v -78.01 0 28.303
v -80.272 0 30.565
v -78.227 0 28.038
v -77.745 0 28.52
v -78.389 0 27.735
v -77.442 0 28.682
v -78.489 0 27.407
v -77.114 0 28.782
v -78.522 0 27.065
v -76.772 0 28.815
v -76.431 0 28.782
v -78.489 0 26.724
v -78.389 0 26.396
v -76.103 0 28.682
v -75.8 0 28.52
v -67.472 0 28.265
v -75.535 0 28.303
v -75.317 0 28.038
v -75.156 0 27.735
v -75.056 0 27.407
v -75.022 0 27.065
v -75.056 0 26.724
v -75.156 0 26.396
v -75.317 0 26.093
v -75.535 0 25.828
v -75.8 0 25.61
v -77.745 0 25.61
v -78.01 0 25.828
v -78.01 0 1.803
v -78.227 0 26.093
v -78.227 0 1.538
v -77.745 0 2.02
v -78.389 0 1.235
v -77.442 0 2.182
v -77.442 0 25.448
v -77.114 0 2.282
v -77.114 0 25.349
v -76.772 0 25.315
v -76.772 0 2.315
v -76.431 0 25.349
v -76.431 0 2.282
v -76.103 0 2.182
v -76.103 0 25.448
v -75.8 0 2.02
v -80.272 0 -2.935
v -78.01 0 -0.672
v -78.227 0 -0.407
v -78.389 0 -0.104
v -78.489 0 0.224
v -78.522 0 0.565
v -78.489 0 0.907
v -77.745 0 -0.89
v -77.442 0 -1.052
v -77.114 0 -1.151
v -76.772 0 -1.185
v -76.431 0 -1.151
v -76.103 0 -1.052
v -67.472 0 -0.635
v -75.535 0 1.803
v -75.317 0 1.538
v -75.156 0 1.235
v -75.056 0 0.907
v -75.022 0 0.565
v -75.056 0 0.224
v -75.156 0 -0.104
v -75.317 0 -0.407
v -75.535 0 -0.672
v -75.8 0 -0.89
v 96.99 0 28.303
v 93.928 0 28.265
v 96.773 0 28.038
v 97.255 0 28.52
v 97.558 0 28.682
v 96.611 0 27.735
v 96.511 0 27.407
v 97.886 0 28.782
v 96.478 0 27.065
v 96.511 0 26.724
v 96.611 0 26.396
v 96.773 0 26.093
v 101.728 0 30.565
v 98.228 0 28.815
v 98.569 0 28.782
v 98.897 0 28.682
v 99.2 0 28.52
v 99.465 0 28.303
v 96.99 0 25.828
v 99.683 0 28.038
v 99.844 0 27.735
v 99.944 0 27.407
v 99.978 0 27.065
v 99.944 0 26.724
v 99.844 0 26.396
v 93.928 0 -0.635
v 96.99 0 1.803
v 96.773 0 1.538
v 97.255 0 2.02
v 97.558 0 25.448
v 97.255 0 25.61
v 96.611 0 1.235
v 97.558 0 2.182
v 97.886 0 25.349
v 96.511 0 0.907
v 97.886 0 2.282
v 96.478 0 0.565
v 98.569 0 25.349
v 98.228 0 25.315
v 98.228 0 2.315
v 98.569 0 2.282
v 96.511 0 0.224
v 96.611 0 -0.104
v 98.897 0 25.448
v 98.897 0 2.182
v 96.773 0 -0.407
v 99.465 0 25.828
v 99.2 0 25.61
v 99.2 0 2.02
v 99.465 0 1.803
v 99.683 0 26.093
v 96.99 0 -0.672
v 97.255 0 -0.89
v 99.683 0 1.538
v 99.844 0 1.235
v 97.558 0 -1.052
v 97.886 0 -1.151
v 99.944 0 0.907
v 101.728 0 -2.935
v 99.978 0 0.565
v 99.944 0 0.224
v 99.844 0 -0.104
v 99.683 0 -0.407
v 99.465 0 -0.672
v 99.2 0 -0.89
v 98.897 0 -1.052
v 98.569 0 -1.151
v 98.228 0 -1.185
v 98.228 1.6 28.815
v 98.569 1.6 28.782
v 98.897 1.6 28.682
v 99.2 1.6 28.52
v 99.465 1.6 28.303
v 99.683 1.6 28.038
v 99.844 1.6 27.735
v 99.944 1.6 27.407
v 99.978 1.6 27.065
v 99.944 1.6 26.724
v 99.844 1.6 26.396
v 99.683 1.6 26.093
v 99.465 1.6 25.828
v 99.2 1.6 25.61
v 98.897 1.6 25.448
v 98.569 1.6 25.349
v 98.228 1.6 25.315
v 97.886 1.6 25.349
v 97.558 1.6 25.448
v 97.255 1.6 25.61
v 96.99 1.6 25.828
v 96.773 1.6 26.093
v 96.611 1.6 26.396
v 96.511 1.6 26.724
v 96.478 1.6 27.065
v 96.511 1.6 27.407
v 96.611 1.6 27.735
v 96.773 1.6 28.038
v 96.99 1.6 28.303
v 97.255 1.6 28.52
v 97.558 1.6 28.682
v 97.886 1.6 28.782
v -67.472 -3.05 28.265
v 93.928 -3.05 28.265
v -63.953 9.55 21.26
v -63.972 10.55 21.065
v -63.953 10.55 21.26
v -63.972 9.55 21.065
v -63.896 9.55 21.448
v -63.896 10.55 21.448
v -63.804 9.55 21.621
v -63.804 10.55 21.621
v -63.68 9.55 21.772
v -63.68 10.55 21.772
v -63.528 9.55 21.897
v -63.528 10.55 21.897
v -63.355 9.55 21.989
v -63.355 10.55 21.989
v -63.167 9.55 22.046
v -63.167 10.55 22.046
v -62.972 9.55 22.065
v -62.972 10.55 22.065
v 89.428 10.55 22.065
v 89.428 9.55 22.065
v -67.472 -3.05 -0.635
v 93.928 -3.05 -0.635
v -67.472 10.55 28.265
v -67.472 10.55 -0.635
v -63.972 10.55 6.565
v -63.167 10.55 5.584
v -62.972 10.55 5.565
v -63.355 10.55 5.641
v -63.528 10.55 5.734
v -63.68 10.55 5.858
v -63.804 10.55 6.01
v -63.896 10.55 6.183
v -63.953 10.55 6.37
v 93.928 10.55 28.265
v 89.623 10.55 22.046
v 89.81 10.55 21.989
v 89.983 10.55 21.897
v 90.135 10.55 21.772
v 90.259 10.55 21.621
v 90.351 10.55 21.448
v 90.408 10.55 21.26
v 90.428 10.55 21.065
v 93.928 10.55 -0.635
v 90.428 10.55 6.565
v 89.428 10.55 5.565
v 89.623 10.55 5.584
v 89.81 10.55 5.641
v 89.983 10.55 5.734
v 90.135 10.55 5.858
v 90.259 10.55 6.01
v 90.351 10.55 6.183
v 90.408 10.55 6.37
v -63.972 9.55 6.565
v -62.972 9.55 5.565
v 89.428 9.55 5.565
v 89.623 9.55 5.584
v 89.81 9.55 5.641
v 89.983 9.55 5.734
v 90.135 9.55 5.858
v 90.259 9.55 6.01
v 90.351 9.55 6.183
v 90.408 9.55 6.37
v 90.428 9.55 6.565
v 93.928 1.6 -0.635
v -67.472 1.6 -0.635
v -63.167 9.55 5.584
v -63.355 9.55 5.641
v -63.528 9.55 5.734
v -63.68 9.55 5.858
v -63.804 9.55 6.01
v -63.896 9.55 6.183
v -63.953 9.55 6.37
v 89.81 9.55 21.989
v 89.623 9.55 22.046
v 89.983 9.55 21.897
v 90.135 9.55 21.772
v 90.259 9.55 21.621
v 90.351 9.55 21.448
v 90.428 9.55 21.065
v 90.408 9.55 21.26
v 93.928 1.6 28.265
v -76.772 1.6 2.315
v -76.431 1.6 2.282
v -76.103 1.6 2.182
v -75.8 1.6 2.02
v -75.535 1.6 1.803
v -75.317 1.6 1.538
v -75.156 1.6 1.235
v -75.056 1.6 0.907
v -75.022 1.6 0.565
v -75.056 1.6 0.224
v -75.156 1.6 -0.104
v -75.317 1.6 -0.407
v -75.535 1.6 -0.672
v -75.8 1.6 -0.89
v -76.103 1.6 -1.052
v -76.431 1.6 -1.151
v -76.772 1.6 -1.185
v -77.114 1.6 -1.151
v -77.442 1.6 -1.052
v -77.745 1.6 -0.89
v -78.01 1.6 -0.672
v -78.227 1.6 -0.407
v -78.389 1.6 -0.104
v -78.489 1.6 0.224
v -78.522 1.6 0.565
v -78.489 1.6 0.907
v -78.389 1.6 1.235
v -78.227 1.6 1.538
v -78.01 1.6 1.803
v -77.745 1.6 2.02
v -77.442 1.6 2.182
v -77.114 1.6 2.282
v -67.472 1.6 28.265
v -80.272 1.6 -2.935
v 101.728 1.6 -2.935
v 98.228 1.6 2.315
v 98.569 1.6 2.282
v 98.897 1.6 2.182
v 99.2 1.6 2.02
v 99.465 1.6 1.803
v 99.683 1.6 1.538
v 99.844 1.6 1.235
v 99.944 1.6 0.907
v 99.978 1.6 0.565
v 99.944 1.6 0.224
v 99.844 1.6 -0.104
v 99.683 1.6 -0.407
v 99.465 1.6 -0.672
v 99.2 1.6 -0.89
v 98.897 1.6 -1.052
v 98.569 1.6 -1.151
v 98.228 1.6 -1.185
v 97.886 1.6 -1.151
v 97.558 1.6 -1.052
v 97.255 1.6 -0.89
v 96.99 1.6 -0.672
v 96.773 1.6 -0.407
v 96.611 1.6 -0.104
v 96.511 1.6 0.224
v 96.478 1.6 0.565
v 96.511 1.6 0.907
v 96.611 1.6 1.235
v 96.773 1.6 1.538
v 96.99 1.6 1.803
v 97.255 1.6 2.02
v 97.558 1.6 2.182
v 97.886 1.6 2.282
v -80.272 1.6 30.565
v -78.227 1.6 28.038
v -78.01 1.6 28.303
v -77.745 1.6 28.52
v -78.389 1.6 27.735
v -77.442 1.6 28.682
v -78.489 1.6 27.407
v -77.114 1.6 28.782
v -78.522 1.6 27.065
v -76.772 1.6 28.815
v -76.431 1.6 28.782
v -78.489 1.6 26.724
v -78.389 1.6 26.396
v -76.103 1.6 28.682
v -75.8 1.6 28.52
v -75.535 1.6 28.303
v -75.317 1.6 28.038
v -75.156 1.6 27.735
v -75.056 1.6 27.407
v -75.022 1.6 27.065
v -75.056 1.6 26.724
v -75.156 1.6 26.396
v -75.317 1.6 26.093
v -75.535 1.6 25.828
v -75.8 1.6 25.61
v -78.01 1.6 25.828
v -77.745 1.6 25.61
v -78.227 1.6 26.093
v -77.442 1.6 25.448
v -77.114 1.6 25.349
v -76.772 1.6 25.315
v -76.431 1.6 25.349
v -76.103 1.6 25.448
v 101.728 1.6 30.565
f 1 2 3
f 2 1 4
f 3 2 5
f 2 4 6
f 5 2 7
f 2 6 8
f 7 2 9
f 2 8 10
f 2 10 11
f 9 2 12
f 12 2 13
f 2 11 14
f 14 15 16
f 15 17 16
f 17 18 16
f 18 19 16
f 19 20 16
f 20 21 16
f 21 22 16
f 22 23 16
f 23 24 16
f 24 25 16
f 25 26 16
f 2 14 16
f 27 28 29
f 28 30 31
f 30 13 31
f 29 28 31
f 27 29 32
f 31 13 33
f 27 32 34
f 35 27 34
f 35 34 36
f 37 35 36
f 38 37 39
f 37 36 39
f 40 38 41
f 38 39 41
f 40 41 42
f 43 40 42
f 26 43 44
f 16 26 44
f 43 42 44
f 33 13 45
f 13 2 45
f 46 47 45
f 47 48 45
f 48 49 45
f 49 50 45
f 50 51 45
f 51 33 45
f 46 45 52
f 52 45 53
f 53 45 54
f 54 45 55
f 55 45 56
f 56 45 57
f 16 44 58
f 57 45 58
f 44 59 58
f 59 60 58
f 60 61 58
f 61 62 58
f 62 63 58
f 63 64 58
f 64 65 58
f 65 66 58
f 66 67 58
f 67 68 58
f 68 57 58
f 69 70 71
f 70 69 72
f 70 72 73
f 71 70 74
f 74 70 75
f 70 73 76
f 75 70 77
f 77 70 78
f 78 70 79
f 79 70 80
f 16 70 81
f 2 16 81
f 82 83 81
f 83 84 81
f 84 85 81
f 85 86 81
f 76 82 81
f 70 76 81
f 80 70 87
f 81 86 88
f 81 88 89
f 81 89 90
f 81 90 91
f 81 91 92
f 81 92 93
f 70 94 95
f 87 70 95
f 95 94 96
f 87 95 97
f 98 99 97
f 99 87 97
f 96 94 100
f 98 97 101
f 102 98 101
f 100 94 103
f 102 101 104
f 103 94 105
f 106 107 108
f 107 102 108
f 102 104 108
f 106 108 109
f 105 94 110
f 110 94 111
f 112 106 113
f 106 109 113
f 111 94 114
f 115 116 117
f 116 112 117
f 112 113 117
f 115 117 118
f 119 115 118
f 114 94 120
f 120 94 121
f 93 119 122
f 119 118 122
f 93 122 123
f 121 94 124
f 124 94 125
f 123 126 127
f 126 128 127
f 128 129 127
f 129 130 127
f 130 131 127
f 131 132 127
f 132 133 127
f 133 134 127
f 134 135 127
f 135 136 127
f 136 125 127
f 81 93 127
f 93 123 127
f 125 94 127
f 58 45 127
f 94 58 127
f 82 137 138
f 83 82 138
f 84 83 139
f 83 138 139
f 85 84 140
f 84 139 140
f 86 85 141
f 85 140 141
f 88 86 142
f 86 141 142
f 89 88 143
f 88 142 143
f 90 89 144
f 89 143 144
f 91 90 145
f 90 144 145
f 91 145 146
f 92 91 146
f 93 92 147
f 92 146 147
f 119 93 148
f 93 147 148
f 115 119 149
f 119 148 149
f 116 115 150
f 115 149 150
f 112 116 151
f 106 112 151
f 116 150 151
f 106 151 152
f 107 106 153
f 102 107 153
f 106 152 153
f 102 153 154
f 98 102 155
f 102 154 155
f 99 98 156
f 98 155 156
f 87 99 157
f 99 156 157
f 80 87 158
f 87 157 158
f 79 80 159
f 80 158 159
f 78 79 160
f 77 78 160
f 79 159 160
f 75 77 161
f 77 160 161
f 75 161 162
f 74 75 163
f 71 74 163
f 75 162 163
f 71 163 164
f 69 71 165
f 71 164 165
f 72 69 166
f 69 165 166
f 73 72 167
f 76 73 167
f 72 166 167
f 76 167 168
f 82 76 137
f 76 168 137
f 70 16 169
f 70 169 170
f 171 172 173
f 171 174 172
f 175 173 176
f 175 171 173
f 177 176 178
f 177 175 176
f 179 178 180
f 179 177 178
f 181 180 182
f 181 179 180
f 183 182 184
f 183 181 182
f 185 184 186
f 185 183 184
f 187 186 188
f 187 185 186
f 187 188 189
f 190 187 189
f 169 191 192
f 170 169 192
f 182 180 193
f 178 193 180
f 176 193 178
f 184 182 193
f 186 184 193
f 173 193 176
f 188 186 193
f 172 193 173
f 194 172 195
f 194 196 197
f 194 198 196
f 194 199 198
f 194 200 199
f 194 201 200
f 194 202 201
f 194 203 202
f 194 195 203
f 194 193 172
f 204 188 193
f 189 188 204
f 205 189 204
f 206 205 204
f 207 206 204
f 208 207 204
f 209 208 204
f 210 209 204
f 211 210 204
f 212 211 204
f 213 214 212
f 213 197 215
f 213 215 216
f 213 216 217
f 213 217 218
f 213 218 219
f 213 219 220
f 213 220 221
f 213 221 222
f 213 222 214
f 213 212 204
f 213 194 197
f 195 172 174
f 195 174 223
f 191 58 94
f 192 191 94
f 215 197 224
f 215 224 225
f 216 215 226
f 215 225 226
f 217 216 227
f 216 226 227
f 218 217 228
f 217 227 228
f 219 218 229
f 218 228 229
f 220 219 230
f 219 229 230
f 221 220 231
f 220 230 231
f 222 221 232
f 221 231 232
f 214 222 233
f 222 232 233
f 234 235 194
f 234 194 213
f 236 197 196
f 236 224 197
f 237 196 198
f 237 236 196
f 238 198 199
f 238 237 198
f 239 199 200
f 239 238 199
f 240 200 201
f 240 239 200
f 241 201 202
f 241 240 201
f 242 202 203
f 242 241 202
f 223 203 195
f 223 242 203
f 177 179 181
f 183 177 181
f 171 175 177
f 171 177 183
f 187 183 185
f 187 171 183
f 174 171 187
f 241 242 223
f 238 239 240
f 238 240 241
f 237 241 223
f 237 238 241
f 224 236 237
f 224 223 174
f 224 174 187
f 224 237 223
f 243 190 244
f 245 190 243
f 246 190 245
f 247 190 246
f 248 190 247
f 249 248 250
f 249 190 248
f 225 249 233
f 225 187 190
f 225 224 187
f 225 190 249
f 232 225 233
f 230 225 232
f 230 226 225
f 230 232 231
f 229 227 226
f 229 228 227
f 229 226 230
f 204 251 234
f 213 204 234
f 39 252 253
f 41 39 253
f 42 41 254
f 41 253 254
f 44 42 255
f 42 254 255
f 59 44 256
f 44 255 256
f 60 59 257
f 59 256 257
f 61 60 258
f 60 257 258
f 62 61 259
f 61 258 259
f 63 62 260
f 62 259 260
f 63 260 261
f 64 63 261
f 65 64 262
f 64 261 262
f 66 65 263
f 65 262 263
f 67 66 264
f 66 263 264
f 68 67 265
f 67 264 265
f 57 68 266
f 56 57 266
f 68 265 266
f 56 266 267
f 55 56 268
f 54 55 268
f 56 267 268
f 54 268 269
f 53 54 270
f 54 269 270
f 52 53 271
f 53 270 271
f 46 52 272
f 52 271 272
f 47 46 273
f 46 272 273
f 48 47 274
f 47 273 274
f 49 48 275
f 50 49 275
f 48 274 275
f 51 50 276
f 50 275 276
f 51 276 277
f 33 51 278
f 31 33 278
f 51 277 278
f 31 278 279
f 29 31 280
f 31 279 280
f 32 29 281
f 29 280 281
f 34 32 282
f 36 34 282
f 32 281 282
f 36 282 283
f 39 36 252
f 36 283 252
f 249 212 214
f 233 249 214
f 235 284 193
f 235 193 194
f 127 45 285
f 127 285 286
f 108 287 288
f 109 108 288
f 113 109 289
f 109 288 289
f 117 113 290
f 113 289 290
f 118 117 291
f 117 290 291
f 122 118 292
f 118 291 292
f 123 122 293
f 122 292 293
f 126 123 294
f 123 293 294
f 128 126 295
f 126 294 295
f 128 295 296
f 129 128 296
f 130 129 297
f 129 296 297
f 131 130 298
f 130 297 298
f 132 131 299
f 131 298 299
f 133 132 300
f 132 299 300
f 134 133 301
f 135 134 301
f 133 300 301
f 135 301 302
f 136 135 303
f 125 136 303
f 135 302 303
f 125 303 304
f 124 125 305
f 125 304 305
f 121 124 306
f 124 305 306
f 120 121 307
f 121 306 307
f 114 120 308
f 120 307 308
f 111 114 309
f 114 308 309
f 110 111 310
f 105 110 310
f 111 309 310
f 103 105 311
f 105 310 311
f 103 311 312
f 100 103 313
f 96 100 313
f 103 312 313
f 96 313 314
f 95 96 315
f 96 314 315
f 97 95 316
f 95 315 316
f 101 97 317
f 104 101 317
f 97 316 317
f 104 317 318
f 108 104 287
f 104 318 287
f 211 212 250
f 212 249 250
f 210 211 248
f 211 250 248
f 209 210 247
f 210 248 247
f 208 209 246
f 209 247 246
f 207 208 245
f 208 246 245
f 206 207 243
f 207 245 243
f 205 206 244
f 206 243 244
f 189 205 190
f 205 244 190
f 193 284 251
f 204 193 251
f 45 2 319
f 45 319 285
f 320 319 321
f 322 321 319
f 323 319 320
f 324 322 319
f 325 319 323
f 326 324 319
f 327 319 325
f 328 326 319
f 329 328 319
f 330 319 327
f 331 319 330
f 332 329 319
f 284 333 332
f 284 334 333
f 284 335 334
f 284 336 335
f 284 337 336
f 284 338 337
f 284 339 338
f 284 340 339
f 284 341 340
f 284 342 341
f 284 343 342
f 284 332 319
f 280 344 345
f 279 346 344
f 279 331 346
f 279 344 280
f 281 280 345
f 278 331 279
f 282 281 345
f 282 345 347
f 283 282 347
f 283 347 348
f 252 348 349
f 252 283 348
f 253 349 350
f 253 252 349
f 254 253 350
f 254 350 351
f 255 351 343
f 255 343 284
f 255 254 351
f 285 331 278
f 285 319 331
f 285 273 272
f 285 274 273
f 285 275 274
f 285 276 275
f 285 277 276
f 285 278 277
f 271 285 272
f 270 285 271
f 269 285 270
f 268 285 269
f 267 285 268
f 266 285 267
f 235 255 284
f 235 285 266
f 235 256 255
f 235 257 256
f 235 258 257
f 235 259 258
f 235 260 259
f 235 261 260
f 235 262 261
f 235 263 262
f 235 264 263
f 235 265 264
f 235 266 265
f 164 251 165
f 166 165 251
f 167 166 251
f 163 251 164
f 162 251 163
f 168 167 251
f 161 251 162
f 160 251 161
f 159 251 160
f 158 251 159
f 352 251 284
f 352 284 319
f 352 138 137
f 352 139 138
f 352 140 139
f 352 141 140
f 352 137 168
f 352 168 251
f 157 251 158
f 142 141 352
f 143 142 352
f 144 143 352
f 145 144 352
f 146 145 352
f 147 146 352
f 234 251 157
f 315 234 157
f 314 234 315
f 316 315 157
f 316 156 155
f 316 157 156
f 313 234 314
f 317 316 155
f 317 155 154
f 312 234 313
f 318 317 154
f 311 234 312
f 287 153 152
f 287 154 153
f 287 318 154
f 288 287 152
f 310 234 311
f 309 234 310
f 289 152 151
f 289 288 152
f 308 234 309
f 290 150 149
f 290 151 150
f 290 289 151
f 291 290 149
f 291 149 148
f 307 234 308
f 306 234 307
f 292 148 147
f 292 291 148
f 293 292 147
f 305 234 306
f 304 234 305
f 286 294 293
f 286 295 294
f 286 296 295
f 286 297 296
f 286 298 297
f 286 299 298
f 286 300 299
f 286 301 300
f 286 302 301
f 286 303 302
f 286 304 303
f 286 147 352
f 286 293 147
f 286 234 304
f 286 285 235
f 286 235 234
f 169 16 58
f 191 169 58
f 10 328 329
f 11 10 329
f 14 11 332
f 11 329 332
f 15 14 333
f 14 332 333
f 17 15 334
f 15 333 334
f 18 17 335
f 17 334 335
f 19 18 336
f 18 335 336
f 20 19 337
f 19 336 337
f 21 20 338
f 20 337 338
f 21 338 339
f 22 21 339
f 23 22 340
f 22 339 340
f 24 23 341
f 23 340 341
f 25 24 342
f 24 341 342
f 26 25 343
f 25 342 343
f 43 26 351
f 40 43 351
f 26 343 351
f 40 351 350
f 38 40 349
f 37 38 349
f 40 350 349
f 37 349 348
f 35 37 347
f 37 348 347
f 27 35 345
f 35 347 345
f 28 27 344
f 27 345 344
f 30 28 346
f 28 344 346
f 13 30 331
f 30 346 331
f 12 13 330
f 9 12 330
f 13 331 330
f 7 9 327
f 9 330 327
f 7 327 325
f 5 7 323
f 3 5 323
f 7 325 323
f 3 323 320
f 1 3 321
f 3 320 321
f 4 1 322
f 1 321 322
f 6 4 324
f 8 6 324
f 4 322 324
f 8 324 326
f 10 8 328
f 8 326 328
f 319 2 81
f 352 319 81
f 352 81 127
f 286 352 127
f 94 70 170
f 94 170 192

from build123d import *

# Parameters (mm, degrees)
SKETCH1_W            = 182
SKETCH1_H            = 33.5
BOSS_EXTRUDE1_DEPTH  = 1.6
SKETCH2_R            = 1.75
CUT_EXTRUDE1_DEPTH   = 1.6
LPATTERN1_COUNT      = 2
LPATTERN1_PITCH      = 175
LPATTERN1_COUNT_DIR2 = 2
LPATTERN1_PITCH_DIR2 = 26.5
SKETCH3_W            = 161.4
SKETCH3_H            = 28.9
BOSS_EXTRUDE2_DEPTH  = 8.95
SKETCH3_2_W          = 161.4
SKETCH3_2_H          = 28.9
BOSS_EXTRUDE3_DEPTH  = 4.65
SKETCH4_W            = 154.4
SKETCH4_H            = 16.5
CUT_EXTRUDE2_DEPTH   = 1
FILLET1_R            = 1
FILLET2_R            = 1
FILLET3_R            = 1
FILLET4_R            = 1


with BuildPart() as part:
    # Sketch1 → Boss-Extrude1 (new body)
    with BuildSketch(Plane(origin=(0, 0, 0), x_dir=(1, 0, 0), z_dir=(0, 1, 0))):
        with Locations((10.727604206, -13.815258398)):
            Rectangle(SKETCH1_W, SKETCH1_H)
    extrude(amount=BOSS_EXTRUDE1_DEPTH)

    # Sketch2 → Cut-Extrude1 (cut)
    with BuildSketch(Plane(origin=(0, 1.6, 0), x_dir=(1, 0, 0), z_dir=(0, 1, 0))):
        with Locations((-76.772395794, -0.565258398)):
            Circle(SKETCH2_R)
    cut_extrude1 = extrude(amount=-CUT_EXTRUDE1_DEPTH, mode=Mode.SUBTRACT)

    # LPattern1: Cut-Extrude1 2 × 2
    with Locations(*[(i * LPATTERN1_PITCH, 0, j * LPATTERN1_PITCH_DIR2) for i in range(LPATTERN1_COUNT) for j in range(LPATTERN1_COUNT_DIR2) if (i, j) != (0, 0)]):
        add(cut_extrude1, mode=Mode.SUBTRACT)

    # Sketch3 → Boss-Extrude2 (add)
    with BuildSketch(Plane(origin=(0, 1.6, 0), x_dir=(1, 0, 0), z_dir=(0, 1, 0))):
        with Locations((13.227604206, -13.815258398)):
            Rectangle(SKETCH3_W, SKETCH3_H)
    extrude(amount=BOSS_EXTRUDE2_DEPTH)

    # Sketch3<2> → Boss-Extrude3 (add)
    with BuildSketch(Plane(origin=(0, 1.6, 0), x_dir=(1, 0, 0), z_dir=(0, 1, 0))):
        with Locations((13.227604206, -13.815258398)):
            Rectangle(SKETCH3_2_W, SKETCH3_2_H)
    extrude(amount=-BOSS_EXTRUDE3_DEPTH)

    # Sketch4 → Cut-Extrude2 (cut)
    with BuildSketch(Plane(origin=(0, 10.55, 0), x_dir=(1, 0, 0), z_dir=(0, 1, 0))):
        with Locations((13.227604206, -13.815258398)):
            Rectangle(SKETCH4_W, SKETCH4_H)
    extrude(amount=-CUT_EXTRUDE2_DEPTH, mode=Mode.SUBTRACT)

    # Fillet1
    fillet1_edges = [part.edges().sort_by_distance(p)[0] for p in [
        (-63.972395794, 10.05, 5.565258398),
    ]]
    fillet(fillet1_edges, radius=FILLET1_R)

    # Fillet2
    fillet2_edges = [part.edges().sort_by_distance(p)[0] for p in [
        (-63.972395794, 10.05, 22.065258398),
    ]]
    fillet(fillet2_edges, radius=FILLET2_R)

    # Fillet3
    fillet3_edges = [part.edges().sort_by_distance(p)[0] for p in [
        (90.427604206, 10.05, 5.565258398),
    ]]
    fillet(fillet3_edges, radius=FILLET3_R)

    # Fillet4
    fillet4_edges = [part.edges().sort_by_distance(p)[0] for p in [
        (90.427604206, 10.05, 22.065258398),
    ]]
    fillet(fillet4_edges, radius=FILLET4_R)


solid = part.part
